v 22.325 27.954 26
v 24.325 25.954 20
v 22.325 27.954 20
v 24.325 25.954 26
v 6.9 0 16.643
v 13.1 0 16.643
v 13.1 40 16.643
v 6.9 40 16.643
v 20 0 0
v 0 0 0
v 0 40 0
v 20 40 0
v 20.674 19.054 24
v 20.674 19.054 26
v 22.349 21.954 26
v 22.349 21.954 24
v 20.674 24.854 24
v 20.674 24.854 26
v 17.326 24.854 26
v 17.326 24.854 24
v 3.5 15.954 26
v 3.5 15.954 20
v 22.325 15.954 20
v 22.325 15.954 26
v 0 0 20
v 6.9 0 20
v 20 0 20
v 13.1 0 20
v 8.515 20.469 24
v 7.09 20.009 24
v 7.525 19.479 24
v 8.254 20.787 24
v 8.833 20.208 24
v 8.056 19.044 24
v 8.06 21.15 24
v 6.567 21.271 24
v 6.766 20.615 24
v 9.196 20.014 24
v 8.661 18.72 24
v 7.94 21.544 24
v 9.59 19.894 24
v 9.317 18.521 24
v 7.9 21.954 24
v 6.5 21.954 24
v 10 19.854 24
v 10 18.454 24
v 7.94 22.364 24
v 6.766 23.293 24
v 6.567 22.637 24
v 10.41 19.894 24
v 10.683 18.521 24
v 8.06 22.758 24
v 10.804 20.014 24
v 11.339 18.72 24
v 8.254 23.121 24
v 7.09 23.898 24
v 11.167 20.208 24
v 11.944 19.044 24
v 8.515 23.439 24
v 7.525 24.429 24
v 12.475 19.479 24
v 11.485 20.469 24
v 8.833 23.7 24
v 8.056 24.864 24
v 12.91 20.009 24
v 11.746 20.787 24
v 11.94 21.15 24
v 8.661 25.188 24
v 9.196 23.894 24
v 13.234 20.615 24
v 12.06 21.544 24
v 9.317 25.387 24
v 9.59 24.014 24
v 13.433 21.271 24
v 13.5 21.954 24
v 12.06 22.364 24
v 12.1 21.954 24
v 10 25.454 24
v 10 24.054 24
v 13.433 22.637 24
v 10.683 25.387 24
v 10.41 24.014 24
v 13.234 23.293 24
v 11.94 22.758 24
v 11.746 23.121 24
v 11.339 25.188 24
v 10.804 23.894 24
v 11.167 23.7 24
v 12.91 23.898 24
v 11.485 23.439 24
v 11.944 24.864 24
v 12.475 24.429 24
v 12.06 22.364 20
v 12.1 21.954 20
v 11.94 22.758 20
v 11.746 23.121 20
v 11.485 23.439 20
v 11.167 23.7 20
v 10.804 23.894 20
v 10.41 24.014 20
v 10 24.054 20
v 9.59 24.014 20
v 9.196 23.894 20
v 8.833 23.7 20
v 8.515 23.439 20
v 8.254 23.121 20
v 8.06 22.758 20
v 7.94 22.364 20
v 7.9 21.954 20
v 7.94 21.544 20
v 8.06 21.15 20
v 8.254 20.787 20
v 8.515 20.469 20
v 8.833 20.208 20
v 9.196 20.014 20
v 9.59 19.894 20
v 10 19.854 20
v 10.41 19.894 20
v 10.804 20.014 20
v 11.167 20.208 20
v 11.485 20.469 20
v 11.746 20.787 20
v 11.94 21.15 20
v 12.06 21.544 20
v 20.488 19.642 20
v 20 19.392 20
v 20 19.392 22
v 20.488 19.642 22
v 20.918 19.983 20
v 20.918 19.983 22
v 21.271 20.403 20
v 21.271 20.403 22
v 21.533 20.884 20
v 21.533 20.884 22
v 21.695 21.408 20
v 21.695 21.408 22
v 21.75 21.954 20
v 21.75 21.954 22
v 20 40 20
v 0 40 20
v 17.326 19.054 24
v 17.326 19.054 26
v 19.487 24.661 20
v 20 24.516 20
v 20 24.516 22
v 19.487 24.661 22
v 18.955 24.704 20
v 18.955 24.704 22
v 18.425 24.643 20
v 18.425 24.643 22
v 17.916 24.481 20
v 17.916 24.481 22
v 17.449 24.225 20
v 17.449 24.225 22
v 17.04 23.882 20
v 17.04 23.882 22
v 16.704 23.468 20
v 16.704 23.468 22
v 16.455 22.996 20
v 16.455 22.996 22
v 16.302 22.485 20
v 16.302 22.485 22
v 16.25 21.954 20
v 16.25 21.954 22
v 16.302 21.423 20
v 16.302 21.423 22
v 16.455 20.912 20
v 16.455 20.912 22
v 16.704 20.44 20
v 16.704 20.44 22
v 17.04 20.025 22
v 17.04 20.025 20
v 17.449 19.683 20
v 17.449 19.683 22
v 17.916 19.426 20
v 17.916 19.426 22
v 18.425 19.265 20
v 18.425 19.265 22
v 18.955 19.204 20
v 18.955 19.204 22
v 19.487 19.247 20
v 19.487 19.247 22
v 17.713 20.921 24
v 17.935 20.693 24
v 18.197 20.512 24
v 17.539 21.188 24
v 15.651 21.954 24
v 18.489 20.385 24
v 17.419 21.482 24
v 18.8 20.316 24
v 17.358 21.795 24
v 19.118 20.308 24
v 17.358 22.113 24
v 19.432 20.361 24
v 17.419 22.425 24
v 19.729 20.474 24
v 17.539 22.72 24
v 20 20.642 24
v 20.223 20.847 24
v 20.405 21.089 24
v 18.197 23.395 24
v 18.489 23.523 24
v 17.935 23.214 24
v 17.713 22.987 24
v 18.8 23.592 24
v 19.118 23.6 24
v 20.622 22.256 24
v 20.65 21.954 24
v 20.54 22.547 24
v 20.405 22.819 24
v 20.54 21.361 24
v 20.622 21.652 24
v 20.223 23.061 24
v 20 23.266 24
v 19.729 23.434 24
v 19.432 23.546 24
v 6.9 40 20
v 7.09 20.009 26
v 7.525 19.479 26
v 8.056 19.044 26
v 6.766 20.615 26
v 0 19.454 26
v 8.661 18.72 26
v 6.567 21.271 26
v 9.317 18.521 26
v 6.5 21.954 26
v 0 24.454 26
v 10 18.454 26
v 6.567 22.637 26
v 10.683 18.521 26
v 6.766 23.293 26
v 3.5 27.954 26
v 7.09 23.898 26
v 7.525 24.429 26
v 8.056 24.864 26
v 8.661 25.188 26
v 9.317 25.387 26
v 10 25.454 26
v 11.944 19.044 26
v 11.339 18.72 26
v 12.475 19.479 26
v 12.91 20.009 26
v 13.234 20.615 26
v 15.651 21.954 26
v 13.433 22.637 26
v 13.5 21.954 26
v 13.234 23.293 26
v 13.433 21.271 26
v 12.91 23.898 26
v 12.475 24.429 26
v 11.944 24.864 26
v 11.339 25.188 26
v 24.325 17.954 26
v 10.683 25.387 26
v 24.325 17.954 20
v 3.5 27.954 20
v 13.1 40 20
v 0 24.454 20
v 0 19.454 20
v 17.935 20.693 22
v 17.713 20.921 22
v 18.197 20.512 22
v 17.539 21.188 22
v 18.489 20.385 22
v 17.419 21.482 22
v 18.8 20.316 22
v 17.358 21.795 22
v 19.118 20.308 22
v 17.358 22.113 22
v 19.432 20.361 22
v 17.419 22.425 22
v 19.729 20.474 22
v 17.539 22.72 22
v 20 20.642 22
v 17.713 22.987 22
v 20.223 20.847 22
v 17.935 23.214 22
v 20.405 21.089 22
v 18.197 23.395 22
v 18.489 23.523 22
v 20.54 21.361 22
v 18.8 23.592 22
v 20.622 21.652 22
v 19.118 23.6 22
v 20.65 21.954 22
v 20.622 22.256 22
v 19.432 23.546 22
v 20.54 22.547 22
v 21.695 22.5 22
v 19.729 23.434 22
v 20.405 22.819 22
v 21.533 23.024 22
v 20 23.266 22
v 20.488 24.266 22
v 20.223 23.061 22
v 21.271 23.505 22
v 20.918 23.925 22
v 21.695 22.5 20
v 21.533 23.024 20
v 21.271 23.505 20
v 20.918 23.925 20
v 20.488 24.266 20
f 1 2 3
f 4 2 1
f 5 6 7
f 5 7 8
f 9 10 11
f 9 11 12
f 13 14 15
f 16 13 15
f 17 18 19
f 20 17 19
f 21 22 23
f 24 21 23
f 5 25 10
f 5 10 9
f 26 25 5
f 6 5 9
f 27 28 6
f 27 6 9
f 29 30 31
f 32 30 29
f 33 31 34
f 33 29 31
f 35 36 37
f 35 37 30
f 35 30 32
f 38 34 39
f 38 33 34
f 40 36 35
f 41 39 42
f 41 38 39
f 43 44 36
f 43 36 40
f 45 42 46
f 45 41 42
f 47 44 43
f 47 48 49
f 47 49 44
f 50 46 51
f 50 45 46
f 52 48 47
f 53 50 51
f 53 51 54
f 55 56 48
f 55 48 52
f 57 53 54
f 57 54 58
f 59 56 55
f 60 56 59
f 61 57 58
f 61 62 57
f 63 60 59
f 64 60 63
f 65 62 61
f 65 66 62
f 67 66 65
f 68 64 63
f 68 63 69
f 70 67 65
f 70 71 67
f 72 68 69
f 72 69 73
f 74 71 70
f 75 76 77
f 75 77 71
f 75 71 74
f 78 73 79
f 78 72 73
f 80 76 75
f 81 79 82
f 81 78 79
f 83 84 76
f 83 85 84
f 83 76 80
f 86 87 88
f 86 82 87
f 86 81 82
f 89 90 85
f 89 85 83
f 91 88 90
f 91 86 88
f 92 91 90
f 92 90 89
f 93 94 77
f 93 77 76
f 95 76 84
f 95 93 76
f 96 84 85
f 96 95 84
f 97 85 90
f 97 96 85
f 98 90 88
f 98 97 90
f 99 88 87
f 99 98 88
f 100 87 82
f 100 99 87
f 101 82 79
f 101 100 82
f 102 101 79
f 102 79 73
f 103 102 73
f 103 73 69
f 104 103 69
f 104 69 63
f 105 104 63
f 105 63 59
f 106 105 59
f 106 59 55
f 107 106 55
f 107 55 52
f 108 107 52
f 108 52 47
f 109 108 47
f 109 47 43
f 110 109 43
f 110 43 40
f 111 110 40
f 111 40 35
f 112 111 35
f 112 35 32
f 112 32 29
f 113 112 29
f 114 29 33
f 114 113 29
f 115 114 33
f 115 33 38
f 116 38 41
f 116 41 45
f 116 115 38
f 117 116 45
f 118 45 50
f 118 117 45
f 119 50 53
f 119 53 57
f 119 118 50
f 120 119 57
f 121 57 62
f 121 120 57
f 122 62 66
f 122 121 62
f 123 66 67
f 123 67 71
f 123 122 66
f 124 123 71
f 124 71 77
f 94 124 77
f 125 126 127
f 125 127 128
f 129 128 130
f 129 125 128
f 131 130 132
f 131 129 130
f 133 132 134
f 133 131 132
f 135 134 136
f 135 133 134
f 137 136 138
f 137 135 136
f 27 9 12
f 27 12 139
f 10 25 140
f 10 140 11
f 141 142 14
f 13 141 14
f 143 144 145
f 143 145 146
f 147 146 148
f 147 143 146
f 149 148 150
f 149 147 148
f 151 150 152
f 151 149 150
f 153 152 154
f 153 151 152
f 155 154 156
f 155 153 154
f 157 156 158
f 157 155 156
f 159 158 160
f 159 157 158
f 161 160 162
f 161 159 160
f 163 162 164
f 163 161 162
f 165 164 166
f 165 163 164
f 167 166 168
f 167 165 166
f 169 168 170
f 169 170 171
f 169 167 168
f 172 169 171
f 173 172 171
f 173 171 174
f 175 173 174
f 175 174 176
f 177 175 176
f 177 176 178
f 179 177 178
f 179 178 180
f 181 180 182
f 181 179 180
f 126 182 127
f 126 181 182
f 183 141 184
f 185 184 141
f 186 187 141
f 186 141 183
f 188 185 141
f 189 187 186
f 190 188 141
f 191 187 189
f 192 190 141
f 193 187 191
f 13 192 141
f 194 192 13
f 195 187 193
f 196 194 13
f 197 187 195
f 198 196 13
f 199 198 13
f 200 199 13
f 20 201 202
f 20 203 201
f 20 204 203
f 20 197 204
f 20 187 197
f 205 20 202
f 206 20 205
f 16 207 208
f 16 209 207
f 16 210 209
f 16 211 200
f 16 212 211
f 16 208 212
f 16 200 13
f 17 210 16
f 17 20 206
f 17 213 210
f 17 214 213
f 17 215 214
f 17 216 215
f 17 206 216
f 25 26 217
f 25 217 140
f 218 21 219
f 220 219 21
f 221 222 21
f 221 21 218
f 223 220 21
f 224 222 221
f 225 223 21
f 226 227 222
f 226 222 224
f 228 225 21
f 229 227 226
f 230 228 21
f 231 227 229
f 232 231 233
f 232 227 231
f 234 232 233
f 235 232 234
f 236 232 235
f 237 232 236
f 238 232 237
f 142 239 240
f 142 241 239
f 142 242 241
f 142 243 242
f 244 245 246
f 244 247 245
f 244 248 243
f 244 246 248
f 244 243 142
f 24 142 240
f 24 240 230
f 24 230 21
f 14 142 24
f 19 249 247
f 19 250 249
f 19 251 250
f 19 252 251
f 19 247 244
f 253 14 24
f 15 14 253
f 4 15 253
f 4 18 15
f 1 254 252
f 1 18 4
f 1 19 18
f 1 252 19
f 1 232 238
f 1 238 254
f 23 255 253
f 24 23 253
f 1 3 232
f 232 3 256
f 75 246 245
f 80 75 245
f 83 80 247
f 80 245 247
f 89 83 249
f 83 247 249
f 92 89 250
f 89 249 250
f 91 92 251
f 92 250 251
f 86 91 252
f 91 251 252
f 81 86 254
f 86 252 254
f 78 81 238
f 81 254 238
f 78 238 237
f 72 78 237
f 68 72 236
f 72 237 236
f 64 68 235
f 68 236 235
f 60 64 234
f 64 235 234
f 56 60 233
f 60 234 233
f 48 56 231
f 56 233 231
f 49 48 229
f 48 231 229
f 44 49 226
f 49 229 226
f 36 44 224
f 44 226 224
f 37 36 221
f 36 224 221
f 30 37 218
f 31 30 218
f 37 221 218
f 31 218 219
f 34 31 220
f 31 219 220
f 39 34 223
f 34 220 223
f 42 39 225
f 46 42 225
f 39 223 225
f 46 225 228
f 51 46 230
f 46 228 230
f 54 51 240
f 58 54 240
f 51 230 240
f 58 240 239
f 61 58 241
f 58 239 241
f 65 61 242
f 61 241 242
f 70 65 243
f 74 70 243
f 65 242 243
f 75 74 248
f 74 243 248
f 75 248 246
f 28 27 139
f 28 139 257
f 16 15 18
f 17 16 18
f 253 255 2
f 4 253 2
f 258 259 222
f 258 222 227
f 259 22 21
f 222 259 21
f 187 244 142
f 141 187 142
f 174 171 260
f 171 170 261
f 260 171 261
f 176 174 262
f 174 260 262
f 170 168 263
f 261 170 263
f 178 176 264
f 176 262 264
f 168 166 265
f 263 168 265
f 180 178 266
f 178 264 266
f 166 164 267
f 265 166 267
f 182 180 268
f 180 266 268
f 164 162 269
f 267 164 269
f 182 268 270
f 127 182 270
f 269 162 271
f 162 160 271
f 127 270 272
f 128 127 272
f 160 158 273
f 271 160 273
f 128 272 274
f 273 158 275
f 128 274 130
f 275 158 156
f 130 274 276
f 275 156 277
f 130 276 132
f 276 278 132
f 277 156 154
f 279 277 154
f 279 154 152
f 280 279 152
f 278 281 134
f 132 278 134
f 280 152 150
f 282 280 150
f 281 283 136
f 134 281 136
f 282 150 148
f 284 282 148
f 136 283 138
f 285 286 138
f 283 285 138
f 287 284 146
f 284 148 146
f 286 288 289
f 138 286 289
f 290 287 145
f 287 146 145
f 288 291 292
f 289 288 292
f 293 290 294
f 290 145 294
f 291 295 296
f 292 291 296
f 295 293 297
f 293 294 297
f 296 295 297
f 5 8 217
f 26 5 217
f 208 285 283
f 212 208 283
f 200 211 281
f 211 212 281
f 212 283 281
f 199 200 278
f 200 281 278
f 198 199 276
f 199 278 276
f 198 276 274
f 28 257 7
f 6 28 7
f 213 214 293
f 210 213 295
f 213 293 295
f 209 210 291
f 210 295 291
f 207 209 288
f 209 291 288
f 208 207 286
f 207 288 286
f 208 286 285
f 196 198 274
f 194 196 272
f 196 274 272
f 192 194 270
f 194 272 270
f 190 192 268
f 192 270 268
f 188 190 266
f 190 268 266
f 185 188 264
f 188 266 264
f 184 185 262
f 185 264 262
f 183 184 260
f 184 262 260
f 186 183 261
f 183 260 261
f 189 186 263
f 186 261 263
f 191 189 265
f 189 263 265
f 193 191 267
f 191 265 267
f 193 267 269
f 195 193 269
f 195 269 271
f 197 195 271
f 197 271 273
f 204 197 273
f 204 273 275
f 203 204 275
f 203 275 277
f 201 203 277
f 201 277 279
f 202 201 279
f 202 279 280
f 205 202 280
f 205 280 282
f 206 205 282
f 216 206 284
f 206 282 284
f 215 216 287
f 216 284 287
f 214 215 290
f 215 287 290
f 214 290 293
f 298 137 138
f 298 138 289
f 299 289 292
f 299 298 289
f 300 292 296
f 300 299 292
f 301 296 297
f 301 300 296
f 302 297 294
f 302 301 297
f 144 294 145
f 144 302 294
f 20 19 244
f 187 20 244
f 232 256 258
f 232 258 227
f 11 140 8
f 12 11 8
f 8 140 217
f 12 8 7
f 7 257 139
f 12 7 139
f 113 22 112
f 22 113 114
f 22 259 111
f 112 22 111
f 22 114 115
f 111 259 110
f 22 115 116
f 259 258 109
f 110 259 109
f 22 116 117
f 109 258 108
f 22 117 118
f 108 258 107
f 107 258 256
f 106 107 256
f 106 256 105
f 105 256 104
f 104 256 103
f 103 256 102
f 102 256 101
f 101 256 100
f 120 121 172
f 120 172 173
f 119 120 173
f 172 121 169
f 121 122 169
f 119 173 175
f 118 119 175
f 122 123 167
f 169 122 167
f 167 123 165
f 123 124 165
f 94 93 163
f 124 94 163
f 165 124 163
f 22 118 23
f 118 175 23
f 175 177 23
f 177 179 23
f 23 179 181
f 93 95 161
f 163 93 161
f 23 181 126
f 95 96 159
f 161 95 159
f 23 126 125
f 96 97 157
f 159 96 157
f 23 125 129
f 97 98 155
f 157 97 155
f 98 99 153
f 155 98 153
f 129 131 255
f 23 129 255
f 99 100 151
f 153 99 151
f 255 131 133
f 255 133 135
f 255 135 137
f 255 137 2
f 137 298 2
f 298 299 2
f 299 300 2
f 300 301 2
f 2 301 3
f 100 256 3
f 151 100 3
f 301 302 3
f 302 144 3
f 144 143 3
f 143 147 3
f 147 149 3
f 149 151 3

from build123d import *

# Parameters (mm, degrees)
F1_DEPTH = 40
F2_W     = 6.9
F2_H     = 12
F2_R     = 2.1
F3_DEPTH = 6
F4_SIZE  = 3.5
F5_SIZE  = 2
F6_DEPTH = 2
F7_R     = 1.65
F7_R_2   = 3.5
F7_R_3   = 2.1
F8_DEPTH = 2


with BuildPart() as f1:
    # F0 (on Front) → F1 (new body)
    with BuildSketch(Plane.XZ):
        Polygon((0, 20), (0, 0), (20, 0), (20, 20), (13.1, 20), (13.1, 16.6428070515), (6.9, 16.6428070515), (6.9, 20), align=None)
    extrude(amount=-F1_DEPTH)


with BuildPart() as f3:
    # F2 (on face) → F3 (new body)
    with BuildSketch(Plane.XY.offset(20)):
        with Locations((3.45, 21.9539443774)):
            Rectangle(F2_W, F2_H)
        with BuildLine():
            Line((20, 27.9539443774), (6.9, 27.9539443774))
            Line((6.9, 27.9539443774), (6.9, 15.9539443774))
            Line((6.9, 15.9539443774), (20, 15.9539443774))
            Line((20, 15.9539443774), (20, 19.3922066859))
            ThreePointArc((20, 19.3922066859), (16.25, 21.9539443774), (20, 24.5156820689))
            Line((20, 24.5156820689), (20, 27.9539443774))
        make_face()
        with Locations((10, 21.9539443774)):
            Circle(F2_R, mode=Mode.SUBTRACT)
        with BuildLine():
            ThreePointArc((21.75, 21.9539443774), (21.2707377656, 23.5051535832), (20, 24.5156820689))
            Line((20, 24.5156820689), (20, 23.2663848523))
            ThreePointArc((20, 23.2663848523), (20.4785973083, 22.6862353032), (20.65, 21.9539443774))
            ThreePointArc((20.65, 21.9539443774), (20.4785973083, 21.2216534516), (20, 20.6415039026))
            Line((20, 20.6415039026), (20, 19.3922066859))
            ThreePointArc((20, 19.3922066859), (21.2707377656, 20.4027351717), (21.75, 21.9539443774))
        make_face()
        with BuildLine():
            Line((20, 23.2663848523), (20, 24.5156820689))
            ThreePointArc((20, 24.5156820689), (16.25, 21.9539443774), (20, 19.3922066859))
            Line((20, 19.3922066859), (20, 20.6415039026))
            ThreePointArc((20, 20.6415039026), (17.35, 21.9539443774), (20, 23.2663848523))
        make_face()
        with BuildLine():
            Line((24.325016886, 27.9539443774), (20, 27.9539443774))
            Line((20, 27.9539443774), (20, 24.5156820689))
            ThreePointArc((20, 24.5156820689), (21.2707377656, 23.5051535832), (21.75, 21.9539443774))
            ThreePointArc((21.75, 21.9539443774), (21.2707377656, 20.4027351717), (20, 19.3922066859))
            Line((20, 19.3922066859), (20, 15.9539443774))
            Line((20, 15.9539443774), (24.325016886, 15.9539443774))
            Line((24.325016886, 15.9539443774), (24.325016886, 27.9539443774))
        make_face()
    extrude(amount=F3_DEPTH)

    # F4
    f4_edges = [f3.edges().sort_by_distance(p)[0] for p in [
        (0, 27.953944, 23),
        (0, 15.953944, 23),
    ]]
    chamfer(f4_edges, length=F4_SIZE)

    # F5
    f5_edges = [f3.edges().sort_by_distance(p)[0] for p in [
        (24.325017, 15.953944, 23),
        (24.325017, 27.953944, 23),
    ]]
    chamfer(f5_edges, length=F5_SIZE)

    # F2 (on face) → F6 (cut)
    with BuildSketch(Plane.XY.offset(20)):
        with BuildLine():
            ThreePointArc((21.75, 21.9539443774), (21.2707377656, 23.5051535832), (20, 24.5156820689))
            Line((20, 24.5156820689), (20, 23.2663848523))
            ThreePointArc((20, 23.2663848523), (20.4785973083, 22.6862353032), (20.65, 21.9539443774))
            ThreePointArc((20.65, 21.9539443774), (20.4785973083, 21.2216534516), (20, 20.6415039026))
            Line((20, 20.6415039026), (20, 19.3922066859))
            ThreePointArc((20, 19.3922066859), (21.2707377656, 20.4027351717), (21.75, 21.9539443774))
        make_face()
        with BuildLine():
            Line((20, 23.2663848523), (20, 24.5156820689))
            ThreePointArc((20, 24.5156820689), (16.25, 21.9539443774), (20, 19.3922066859))
            Line((20, 19.3922066859), (20, 20.6415039026))
            ThreePointArc((20, 20.6415039026), (17.35, 21.9539443774), (20, 23.2663848523))
        make_face()
    extrude(amount=F6_DEPTH, mode=Mode.SUBTRACT)

    # F7 (on face) → F8 (cut)
    with BuildSketch(Plane.XY.offset(26)):
        Polygon((20.6743157806, 24.8539443774), (17.3256842194, 24.8539443774), (15.6513684387, 21.9539443774), (17.3256842194, 19.0539443774), (20.6743157806, 19.0539443774), (22.3486315613, 21.9539443774), align=None)
        with Locations((19, 21.9539443774)):
            Circle(F7_R, mode=Mode.SUBTRACT)
        with Locations((10, 21.9539443774)):
            Circle(F7_R_2)
        with Locations((10, 21.9539443774)):
            Circle(F7_R_3, mode=Mode.SUBTRACT)
    extrude(amount=-F8_DEPTH, mode=Mode.SUBTRACT)


solid = Compound([f1.part, f3.part])
